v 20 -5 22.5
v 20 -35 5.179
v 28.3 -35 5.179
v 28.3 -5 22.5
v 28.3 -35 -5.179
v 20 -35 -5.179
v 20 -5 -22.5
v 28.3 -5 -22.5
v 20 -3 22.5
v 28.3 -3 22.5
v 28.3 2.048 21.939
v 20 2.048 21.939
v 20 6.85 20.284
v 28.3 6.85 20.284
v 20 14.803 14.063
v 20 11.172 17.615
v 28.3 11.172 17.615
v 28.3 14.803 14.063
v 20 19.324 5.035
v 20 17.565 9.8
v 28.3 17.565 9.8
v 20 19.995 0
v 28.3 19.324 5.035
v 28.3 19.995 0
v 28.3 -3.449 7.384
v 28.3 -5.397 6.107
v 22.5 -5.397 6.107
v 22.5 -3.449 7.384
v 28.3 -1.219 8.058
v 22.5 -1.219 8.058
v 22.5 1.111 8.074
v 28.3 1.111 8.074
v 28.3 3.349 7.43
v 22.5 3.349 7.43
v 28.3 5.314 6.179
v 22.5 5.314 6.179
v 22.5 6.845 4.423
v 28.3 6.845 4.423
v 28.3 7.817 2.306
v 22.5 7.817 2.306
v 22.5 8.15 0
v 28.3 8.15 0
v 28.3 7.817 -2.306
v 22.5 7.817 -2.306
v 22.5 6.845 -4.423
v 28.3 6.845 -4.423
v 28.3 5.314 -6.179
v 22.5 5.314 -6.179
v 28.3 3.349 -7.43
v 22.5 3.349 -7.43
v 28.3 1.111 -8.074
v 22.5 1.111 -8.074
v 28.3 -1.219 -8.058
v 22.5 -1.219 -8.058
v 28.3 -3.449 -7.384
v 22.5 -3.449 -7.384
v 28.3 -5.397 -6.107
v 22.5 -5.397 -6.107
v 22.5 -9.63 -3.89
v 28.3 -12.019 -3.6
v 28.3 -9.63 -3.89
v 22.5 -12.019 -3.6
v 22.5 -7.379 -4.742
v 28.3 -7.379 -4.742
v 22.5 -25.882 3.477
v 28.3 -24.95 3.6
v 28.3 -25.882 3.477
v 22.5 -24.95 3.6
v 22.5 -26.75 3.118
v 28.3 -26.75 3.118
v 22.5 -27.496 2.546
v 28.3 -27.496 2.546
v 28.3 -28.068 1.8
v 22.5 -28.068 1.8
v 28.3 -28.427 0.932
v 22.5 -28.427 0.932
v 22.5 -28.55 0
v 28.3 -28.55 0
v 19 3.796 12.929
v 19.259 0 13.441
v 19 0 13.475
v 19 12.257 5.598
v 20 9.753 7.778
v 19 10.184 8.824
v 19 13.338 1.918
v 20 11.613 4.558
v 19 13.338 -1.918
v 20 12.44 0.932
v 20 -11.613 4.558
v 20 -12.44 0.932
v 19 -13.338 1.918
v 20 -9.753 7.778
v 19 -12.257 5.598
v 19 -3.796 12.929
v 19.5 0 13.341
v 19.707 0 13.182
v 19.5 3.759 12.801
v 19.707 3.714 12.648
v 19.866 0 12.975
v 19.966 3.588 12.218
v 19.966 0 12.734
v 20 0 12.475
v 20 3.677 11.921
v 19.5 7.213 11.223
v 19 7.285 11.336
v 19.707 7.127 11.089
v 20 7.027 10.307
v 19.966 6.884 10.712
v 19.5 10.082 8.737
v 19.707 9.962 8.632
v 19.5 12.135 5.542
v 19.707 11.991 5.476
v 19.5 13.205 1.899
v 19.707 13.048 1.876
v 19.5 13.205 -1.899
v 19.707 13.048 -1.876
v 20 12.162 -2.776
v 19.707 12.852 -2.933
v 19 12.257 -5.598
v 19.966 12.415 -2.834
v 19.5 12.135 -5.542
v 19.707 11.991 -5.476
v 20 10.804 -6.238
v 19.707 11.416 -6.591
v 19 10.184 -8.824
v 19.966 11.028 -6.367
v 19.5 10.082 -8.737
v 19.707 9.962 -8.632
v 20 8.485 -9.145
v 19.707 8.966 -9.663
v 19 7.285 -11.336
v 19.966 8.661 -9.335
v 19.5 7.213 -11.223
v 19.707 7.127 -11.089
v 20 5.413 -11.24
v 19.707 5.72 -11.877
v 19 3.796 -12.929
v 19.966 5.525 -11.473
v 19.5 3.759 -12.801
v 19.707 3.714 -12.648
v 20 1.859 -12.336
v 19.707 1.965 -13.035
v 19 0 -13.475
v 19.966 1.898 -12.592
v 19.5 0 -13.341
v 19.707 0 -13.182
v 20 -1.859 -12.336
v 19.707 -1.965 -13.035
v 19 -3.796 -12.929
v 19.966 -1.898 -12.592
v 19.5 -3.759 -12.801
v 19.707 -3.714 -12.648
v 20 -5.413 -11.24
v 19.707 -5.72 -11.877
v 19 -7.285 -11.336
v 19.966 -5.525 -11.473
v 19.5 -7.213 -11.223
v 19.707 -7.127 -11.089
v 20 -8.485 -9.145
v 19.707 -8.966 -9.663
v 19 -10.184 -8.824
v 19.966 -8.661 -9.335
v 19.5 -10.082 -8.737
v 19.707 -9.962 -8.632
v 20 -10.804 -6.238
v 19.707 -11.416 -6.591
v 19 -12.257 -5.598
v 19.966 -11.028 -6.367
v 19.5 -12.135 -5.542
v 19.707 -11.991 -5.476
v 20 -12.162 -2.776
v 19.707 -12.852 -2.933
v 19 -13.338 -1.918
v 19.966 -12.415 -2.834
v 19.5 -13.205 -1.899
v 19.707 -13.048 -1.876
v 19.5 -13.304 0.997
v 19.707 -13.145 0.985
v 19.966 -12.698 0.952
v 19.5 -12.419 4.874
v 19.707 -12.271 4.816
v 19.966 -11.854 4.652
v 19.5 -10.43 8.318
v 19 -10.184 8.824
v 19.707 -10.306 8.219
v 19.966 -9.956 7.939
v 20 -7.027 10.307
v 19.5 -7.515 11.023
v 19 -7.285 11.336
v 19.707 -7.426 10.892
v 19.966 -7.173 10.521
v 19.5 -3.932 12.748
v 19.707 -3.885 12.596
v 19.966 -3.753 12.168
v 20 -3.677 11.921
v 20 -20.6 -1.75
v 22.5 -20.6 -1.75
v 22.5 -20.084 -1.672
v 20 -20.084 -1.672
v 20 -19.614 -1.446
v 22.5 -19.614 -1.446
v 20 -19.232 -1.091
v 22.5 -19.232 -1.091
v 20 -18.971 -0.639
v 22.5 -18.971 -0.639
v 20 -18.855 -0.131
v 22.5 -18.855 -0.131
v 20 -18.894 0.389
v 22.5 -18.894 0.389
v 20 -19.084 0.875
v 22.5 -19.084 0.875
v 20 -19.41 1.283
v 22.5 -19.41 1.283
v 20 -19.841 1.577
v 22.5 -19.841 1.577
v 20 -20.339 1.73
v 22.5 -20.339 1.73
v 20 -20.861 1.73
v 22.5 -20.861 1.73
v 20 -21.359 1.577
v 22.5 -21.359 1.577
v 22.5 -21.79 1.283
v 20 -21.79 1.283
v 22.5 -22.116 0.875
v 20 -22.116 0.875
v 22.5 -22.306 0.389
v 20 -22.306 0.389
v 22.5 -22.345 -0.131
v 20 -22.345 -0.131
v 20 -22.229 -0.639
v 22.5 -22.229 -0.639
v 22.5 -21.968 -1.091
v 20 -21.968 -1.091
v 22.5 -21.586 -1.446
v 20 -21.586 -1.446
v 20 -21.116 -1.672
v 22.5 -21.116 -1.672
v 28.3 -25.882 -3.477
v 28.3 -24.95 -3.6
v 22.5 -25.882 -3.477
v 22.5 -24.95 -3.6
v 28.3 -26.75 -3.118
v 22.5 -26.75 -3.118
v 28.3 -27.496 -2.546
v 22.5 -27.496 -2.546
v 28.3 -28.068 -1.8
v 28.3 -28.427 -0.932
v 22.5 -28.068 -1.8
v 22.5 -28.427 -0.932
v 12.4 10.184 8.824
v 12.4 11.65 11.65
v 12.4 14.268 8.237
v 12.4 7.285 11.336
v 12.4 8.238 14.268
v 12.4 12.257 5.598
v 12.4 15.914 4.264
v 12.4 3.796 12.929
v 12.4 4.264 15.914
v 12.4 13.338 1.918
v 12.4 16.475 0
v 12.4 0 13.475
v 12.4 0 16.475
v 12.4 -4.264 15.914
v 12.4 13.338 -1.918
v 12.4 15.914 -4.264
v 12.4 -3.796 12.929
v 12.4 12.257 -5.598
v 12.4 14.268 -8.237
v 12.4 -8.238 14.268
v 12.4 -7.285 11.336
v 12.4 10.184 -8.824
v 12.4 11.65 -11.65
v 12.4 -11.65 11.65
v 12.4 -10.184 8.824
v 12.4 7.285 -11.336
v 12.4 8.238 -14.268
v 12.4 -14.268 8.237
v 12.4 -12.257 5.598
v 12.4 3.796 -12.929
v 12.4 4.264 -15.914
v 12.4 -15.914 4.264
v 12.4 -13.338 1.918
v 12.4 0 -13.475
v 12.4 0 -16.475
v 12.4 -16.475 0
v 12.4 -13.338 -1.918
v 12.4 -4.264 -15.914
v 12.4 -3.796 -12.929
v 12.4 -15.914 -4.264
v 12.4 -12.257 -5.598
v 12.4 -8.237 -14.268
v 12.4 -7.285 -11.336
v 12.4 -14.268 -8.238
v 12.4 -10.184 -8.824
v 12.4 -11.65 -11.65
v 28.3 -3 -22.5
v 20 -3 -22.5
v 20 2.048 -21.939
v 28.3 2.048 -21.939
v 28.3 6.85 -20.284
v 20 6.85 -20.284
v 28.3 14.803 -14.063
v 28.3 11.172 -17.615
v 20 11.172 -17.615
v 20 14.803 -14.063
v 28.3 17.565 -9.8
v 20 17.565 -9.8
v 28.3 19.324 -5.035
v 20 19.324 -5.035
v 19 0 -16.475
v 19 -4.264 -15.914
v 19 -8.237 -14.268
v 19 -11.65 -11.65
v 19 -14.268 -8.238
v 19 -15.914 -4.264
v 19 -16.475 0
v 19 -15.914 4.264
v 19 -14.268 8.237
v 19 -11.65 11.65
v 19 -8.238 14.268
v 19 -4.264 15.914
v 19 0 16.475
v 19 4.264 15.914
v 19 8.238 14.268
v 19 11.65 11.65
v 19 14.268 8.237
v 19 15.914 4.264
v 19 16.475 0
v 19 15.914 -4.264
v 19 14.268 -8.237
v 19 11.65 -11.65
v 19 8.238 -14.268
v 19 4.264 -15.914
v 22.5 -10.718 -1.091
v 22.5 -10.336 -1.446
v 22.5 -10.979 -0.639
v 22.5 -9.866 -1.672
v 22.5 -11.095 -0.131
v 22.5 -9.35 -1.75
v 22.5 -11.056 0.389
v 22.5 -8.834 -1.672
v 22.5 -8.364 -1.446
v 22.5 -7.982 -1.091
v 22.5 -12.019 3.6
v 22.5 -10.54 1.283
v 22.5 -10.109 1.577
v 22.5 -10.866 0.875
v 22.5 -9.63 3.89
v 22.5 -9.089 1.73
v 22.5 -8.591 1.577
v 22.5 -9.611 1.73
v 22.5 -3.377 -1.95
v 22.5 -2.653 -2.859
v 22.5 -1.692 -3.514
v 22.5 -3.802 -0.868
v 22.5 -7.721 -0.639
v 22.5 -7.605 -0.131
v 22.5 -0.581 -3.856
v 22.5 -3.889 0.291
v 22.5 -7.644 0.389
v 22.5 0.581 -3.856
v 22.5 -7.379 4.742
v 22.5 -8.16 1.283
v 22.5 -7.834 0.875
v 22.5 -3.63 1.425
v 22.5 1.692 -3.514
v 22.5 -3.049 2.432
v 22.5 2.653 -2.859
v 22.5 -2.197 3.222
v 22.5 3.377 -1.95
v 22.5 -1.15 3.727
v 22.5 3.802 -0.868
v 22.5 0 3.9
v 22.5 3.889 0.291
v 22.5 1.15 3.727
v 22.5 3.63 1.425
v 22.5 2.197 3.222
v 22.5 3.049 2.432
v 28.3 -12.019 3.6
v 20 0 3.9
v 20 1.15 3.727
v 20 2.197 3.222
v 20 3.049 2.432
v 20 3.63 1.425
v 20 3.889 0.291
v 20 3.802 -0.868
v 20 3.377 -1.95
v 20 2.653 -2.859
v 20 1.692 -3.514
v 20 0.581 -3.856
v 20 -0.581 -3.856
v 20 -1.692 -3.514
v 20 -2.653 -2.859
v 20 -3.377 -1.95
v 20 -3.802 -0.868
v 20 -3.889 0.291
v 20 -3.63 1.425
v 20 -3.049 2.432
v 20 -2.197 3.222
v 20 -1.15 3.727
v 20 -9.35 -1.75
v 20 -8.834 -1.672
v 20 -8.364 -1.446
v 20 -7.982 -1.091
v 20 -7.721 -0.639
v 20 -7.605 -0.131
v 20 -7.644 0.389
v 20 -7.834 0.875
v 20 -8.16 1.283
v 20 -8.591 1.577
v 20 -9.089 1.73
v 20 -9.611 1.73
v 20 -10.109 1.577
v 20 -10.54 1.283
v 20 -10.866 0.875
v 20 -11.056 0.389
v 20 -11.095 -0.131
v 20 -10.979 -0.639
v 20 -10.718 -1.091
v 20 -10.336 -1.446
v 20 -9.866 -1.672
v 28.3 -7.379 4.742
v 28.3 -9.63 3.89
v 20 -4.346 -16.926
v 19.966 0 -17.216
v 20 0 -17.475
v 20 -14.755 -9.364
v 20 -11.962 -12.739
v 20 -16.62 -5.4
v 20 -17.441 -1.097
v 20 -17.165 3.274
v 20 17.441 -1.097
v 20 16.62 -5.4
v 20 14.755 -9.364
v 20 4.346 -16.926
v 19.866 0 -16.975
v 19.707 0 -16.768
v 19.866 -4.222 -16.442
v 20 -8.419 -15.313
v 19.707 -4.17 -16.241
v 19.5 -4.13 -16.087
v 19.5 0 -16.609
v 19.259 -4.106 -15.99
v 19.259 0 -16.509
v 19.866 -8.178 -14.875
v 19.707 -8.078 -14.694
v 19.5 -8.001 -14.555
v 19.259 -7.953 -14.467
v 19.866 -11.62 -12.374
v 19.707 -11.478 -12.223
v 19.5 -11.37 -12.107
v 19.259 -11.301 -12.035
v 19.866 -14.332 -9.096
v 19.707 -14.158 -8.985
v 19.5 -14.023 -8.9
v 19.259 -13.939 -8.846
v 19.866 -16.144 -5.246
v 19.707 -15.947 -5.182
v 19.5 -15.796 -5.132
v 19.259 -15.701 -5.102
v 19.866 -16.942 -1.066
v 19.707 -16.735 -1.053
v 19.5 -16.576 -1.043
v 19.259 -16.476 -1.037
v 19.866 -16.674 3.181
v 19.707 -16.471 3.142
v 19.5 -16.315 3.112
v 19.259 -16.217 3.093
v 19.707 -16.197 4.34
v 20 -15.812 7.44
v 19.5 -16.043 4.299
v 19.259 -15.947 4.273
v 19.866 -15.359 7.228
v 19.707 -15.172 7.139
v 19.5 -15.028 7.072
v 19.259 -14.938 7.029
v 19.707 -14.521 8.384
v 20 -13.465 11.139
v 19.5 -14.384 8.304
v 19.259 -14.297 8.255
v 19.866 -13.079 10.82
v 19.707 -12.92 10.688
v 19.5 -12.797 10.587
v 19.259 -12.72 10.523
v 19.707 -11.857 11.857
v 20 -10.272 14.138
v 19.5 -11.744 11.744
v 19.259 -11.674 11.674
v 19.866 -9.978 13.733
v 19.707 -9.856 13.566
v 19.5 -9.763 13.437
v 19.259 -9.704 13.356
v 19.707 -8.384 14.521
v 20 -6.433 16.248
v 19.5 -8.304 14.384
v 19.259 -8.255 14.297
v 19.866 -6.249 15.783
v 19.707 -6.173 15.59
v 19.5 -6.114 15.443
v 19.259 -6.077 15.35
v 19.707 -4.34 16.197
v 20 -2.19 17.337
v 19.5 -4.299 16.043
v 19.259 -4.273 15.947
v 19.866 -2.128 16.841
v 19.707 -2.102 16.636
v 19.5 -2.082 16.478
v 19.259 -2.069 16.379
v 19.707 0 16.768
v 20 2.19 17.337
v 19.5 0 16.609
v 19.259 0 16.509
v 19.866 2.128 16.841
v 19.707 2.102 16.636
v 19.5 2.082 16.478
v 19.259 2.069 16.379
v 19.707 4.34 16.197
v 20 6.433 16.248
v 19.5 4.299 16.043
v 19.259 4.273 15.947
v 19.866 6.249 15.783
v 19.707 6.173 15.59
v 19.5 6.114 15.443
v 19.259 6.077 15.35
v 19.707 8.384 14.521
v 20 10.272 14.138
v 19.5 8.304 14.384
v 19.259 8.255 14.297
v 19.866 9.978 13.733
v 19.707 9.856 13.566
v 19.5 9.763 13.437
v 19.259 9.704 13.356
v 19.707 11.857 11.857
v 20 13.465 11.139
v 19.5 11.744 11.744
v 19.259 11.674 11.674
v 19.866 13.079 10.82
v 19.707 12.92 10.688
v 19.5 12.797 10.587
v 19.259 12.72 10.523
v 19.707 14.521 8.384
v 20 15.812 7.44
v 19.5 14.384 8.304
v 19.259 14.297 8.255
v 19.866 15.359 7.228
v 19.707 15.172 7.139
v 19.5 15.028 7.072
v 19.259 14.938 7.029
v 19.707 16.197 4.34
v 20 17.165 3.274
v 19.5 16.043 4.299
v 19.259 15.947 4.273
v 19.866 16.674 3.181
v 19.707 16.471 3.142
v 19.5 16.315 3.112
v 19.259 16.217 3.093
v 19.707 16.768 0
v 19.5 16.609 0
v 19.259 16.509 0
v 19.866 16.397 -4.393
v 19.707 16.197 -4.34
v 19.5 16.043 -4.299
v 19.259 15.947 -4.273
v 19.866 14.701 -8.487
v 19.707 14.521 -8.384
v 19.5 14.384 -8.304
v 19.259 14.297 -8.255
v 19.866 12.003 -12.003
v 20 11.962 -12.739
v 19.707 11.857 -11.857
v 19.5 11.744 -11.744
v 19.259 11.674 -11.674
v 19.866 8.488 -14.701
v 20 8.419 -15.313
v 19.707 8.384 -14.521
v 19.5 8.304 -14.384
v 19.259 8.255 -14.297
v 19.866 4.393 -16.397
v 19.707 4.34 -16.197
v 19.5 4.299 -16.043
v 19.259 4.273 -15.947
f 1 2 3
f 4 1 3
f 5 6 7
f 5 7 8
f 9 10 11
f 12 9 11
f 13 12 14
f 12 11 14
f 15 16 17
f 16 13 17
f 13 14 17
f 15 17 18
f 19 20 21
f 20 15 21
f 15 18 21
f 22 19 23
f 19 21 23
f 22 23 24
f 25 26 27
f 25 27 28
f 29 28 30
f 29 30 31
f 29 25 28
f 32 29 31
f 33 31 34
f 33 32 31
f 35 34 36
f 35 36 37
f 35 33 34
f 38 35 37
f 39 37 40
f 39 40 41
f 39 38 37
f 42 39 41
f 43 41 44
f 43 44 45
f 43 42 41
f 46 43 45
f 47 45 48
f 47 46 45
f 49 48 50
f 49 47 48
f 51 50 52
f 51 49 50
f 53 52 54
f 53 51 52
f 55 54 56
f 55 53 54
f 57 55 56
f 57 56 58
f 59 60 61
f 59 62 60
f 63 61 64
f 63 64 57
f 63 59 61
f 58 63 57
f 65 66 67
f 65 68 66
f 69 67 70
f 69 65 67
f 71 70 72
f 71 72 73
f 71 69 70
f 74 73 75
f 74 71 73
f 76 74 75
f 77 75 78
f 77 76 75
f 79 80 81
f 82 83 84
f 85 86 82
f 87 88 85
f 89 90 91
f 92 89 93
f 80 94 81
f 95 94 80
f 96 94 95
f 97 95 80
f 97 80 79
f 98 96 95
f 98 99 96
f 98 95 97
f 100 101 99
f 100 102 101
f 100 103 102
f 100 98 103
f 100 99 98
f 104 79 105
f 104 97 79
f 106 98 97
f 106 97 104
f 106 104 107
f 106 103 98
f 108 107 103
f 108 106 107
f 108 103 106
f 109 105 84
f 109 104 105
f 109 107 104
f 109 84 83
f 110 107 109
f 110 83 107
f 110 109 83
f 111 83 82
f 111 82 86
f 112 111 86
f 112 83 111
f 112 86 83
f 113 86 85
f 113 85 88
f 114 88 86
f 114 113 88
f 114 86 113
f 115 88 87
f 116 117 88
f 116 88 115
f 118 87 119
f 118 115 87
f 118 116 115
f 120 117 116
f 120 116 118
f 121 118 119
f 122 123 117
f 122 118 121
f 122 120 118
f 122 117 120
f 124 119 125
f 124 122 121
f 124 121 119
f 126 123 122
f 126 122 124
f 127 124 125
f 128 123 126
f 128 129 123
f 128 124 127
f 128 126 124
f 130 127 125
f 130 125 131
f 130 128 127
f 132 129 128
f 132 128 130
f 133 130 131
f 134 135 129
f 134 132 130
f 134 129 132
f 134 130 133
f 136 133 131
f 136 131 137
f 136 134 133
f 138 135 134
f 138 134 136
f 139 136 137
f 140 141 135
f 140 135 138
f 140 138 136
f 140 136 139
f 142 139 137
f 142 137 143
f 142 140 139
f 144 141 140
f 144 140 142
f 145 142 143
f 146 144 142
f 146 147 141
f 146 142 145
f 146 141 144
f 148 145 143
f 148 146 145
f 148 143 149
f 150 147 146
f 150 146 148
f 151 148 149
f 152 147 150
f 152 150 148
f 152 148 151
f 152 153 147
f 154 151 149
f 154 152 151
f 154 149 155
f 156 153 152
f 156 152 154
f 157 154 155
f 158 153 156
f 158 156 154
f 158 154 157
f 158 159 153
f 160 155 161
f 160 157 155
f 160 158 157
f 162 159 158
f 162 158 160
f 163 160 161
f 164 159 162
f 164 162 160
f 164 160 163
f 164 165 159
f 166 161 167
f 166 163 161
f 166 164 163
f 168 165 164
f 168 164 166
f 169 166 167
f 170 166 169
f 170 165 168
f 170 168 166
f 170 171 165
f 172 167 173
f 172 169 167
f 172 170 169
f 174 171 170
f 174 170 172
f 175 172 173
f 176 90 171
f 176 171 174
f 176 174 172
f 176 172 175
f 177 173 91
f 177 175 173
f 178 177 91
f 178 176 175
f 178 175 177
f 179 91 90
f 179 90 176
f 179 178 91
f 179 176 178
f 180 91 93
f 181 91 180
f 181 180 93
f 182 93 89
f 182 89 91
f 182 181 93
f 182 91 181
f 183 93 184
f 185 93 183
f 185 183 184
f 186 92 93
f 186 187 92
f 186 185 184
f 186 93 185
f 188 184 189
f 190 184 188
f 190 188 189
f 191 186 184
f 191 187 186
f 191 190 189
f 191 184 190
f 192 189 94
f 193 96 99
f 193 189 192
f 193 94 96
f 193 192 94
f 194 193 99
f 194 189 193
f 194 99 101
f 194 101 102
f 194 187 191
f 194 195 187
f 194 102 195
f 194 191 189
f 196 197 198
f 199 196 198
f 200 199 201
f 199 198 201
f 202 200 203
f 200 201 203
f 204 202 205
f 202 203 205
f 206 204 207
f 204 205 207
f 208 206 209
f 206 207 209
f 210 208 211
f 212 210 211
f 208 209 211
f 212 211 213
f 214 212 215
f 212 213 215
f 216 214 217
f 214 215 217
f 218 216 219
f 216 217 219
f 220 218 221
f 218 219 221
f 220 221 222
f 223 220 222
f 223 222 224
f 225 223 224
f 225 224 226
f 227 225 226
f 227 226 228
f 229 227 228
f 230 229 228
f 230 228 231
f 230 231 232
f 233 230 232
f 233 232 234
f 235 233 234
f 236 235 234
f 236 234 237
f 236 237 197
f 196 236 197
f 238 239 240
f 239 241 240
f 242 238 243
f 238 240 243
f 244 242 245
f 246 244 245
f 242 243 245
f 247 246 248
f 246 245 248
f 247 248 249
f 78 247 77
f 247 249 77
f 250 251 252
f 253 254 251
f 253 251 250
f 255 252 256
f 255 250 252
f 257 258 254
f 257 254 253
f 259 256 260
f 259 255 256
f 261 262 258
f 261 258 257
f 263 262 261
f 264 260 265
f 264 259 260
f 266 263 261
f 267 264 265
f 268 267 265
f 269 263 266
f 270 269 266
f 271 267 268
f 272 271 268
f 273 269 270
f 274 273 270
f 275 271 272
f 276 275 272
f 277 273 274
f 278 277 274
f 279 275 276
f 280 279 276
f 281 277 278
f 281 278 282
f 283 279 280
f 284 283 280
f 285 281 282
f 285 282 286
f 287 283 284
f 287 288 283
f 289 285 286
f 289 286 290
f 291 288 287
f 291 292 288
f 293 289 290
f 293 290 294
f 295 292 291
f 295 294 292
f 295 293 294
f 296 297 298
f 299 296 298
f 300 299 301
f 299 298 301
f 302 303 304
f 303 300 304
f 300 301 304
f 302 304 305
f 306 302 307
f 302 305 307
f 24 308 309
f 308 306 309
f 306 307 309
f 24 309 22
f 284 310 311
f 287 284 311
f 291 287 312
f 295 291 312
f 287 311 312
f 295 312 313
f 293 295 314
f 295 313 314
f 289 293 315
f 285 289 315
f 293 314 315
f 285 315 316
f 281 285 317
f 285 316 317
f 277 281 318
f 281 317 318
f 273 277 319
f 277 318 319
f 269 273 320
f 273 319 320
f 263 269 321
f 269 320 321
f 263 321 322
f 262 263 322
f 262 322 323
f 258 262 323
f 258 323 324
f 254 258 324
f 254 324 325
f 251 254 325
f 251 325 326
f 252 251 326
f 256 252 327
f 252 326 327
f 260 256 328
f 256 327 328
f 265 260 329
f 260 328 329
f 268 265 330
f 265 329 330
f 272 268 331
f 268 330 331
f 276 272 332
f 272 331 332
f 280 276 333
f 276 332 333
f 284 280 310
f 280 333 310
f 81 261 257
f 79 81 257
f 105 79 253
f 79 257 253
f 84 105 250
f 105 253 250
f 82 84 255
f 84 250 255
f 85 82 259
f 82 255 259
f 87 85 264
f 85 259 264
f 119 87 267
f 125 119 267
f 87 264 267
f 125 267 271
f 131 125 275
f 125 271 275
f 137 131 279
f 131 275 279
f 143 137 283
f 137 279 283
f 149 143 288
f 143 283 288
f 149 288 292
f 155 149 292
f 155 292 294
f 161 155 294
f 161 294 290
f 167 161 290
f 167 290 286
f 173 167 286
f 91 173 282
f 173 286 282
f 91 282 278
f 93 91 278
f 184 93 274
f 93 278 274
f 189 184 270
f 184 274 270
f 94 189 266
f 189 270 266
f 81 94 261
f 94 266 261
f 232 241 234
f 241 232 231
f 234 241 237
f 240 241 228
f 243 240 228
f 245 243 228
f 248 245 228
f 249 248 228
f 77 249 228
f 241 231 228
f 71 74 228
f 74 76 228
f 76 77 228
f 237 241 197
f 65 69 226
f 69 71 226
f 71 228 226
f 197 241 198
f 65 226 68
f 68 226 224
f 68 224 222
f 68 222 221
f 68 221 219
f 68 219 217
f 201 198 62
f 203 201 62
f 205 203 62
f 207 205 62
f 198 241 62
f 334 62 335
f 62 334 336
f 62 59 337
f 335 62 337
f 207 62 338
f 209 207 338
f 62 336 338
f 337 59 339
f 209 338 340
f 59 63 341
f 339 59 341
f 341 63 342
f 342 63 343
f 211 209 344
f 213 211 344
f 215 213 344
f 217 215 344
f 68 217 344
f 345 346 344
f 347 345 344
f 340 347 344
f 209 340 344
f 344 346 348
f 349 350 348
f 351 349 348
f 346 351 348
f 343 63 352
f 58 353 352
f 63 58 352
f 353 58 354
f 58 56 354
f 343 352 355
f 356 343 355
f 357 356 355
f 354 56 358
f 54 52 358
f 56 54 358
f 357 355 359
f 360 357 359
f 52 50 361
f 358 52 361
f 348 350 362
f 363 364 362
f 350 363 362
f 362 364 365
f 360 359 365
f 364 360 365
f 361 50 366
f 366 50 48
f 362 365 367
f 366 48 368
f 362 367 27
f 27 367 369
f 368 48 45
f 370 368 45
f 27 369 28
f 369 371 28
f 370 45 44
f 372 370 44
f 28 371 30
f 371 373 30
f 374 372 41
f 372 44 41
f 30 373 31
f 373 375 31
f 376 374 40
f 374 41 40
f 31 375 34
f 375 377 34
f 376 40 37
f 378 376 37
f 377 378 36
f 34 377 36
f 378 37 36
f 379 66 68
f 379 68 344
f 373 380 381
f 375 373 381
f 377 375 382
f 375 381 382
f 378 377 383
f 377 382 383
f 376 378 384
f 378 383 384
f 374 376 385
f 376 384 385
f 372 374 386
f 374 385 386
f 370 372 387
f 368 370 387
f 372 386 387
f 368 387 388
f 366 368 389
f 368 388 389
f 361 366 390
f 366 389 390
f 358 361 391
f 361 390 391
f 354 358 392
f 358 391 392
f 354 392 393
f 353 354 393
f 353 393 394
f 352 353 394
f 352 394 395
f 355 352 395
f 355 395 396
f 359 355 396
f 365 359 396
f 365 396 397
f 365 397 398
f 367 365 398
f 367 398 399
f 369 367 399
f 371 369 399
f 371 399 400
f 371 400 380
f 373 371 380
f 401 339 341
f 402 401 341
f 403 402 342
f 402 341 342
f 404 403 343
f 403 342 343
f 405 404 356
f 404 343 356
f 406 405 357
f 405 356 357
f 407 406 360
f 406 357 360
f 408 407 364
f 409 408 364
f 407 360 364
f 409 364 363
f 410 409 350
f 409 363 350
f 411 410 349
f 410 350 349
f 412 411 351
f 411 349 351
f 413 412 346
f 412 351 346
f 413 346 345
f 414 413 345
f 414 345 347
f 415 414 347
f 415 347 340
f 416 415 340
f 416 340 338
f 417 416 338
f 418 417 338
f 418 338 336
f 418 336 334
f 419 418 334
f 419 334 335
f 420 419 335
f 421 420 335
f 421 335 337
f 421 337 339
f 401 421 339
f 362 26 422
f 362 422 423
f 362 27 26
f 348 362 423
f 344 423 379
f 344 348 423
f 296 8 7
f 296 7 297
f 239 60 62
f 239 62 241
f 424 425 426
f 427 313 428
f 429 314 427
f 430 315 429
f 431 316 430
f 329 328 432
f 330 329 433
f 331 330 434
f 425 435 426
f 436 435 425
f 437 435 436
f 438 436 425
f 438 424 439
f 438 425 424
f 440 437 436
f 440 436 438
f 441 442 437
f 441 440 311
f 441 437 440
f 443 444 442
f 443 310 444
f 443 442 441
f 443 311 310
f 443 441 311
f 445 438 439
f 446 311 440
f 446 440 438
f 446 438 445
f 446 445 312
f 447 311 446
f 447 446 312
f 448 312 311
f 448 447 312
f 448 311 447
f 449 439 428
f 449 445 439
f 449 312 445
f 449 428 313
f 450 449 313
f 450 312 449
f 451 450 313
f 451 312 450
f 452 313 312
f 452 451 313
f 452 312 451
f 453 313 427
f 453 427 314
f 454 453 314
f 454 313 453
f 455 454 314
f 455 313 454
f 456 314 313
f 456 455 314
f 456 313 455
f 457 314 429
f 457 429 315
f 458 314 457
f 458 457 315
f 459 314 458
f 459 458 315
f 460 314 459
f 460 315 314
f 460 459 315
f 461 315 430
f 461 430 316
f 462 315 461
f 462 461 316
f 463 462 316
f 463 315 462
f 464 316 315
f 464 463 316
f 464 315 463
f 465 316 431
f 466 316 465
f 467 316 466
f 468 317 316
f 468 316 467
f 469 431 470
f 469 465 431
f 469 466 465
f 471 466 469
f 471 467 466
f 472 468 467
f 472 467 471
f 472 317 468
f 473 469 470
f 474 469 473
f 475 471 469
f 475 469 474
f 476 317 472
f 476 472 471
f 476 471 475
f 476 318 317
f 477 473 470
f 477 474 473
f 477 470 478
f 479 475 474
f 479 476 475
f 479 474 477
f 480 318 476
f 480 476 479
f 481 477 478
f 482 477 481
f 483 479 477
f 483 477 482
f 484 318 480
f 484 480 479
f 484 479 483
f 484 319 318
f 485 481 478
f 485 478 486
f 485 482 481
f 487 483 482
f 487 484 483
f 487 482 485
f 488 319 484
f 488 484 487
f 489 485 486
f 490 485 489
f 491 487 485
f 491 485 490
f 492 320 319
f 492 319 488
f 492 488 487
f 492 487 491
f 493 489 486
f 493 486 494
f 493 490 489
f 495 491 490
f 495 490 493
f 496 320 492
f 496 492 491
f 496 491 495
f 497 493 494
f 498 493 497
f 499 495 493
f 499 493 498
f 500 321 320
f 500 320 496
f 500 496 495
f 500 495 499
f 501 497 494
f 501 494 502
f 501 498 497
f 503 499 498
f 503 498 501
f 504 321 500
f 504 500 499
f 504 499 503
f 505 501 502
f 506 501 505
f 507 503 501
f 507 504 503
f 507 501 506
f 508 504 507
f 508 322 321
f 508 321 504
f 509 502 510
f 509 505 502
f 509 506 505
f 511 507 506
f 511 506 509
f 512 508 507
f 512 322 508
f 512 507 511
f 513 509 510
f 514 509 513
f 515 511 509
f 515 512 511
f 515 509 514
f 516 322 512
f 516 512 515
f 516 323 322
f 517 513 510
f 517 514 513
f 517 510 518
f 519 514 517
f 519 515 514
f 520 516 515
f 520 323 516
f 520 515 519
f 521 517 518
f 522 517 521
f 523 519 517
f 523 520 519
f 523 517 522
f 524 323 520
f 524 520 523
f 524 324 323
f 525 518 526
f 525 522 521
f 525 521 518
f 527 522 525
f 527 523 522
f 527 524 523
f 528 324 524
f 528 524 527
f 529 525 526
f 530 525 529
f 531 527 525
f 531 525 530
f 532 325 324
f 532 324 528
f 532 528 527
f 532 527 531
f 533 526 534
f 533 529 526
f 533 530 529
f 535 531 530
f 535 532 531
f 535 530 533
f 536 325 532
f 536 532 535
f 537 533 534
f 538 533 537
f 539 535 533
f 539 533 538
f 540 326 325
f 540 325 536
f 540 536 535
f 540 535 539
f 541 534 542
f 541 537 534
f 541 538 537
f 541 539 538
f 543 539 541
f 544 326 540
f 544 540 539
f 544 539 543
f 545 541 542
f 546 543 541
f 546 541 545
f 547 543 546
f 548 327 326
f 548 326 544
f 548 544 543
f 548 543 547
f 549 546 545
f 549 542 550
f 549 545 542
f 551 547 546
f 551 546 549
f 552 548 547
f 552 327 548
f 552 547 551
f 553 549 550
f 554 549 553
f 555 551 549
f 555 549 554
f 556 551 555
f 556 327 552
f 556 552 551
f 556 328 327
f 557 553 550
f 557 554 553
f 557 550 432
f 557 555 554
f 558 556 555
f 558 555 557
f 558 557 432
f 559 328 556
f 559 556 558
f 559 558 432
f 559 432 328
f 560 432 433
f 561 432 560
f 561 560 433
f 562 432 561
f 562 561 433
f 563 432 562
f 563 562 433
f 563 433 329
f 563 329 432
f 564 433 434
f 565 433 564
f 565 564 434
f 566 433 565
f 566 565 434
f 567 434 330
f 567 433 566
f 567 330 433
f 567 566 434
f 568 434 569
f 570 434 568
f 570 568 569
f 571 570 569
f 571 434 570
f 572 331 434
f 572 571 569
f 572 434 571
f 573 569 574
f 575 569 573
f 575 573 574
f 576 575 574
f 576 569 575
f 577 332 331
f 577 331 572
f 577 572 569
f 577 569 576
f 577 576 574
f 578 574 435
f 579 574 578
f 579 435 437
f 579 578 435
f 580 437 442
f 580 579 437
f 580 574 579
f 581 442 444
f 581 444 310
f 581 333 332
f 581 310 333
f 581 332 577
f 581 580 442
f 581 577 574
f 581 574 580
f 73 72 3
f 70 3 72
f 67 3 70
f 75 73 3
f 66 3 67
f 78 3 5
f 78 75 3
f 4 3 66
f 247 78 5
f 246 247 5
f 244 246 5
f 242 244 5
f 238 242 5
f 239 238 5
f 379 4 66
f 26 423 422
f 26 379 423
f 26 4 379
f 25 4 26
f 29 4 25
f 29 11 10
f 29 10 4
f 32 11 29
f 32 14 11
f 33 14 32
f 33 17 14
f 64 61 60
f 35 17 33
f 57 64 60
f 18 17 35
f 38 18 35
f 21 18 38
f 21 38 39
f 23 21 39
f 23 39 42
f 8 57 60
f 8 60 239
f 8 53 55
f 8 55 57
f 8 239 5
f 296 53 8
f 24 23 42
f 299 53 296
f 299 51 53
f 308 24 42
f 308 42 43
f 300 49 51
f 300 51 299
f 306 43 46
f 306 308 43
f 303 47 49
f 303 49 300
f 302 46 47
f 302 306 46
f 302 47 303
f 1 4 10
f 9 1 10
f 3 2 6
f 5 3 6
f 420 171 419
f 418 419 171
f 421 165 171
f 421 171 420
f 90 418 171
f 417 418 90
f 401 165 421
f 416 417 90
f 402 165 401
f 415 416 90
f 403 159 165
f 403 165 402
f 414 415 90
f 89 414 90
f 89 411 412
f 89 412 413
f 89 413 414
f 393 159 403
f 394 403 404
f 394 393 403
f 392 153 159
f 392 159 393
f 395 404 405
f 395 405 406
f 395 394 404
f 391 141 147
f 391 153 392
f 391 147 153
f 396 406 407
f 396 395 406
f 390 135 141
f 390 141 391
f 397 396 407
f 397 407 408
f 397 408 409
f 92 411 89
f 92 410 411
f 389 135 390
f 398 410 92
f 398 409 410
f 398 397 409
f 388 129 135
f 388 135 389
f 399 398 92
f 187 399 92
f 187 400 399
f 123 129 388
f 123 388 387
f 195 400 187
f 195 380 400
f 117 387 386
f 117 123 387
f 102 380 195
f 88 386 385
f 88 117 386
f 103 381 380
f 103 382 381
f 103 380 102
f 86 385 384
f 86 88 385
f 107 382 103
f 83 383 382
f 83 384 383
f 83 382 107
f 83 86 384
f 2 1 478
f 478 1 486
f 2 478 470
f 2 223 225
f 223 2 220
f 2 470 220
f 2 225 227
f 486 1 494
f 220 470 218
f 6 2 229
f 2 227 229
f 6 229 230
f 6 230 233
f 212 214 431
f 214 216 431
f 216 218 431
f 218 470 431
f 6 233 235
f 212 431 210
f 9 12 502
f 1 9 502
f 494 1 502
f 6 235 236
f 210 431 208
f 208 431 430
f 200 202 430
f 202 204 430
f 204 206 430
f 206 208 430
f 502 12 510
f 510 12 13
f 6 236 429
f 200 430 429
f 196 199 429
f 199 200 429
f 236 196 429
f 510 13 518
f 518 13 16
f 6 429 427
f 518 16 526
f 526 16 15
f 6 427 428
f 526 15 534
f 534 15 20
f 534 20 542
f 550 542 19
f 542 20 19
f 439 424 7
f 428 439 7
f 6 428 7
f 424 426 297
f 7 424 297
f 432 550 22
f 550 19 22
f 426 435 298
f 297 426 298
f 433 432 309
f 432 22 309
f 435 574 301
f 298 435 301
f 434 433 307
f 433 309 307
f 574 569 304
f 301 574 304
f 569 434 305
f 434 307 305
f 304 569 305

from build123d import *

# Parameters (mm, degrees)
SKETCH1_W           = 20
SKETCH1_H           = 20
BOSS_EXTRUDE1_DEPTH = 20
SKETCH2_W           = 45
SKETCH2_H           = 70
BOSS_EXTRUDE2_DEPTH = 8.3
CUT_EXTRUDE1_DEPTH  = 5.8
FILLET1_R           = 3.6
FILLET2_R           = 10
SKETCH5_R           = 3.9
CUT_EXTRUDE2_DEPTH  = 51.320373608
CUT_EXTRUDE3_REACH  = 49.302
SKETCH6_R           = 1.75
SKETCH13_W          = 20
SKETCH13_H          = 20
CUT_EXTRUDE9_DEPTH  = 20
SKETCH14_R          = 16.475
BOSS_EXTRUDE3_DEPTH = 7.6
SKETCH15_W          = 8.3
SKETCH15_H          = 45
CUT_EXTRUDE10_DEPTH = 15
FILLET3_R           = 23
CHAMFER1_SIZE       = 30
CHAMFER1_SIZE2      = 17.320508076
CHAMFER2_SIZE       = 30
CHAMFER2_SIZE2      = 17.320508076
SKETCH16_R          = 13.475
CUT_EXTRUDE11_DEPTH = 7.6
FILLET4_R           = 1


# Some blends are built 0.0001 mm under size
with BuildPart() as part:
    # Sketch1 → Boss-Extrude1 (new body)
    with BuildSketch(Plane(origin=(0, 0, 0), x_dir=(0, 0, -1), z_dir=(1, 0, 0))):
        Rectangle(SKETCH1_W, SKETCH1_H)
    extrude(amount=BOSS_EXTRUDE1_DEPTH)

    # Sketch2 → Boss-Extrude2 (add)
    with BuildSketch(Plane(origin=(20, 0, 0), x_dir=(0, 0, -1), z_dir=(1, 0, 0))):
        Rectangle(SKETCH2_W, SKETCH2_H)
    extrude(amount=BOSS_EXTRUDE2_DEPTH)

    # Sketch4 → Cut-Extrude1 (cut)
    with BuildSketch(Plane(origin=(28.3, 0, 0), x_dir=(0, 0, -1), z_dir=(1, 0, 0))):
        with BuildLine():
            Line((3.6, -28.55), (-3.6, -28.55))
            Line((-3.6, -28.55), (-3.6, -7.311805523))
            ThreePointArc((-3.6, -7.311805523), (0, 8.15), (3.6, -7.311805523))
            Line((3.6, -7.311805523), (3.6, -28.55))
        make_face()
    extrude(amount=-CUT_EXTRUDE1_DEPTH, mode=Mode.SUBTRACT)

    # Fillet1
    fillet1_edges = [part.edges().sort_by_distance(p)[0] for p in [
        (25.4, -28.55, 3.6),
        (25.4, -28.55, -3.6),
    ]]
    fillet(fillet1_edges, radius=FILLET1_R - 0.0001)  # a hair under: the kernel refuses the full size

    # Fillet2
    fillet2_edges = [part.edges().sort_by_distance(p)[0] for p in [
        (25.4, -7.311805523, 3.6),
        (25.4, -7.311805523, -3.6),
    ]]
    fillet(fillet2_edges, radius=FILLET2_R)

    # Sketch5 → Cut-Extrude2 (cut, through all)
    with BuildSketch(Plane.ZY):
        Circle(SKETCH5_R)
    extrude(amount=-CUT_EXTRUDE2_DEPTH, mode=Mode.SUBTRACT)

    # Sketch6 → Cut-Extrude3 (cut, up to next)
    with BuildSketch(Plane(origin=(22.5, 0, 0), x_dir=(0, 0, -1), z_dir=(1, 0, 0)), mode=Mode.PRIVATE) as cut_extrude3_sk1:
        with Locations((0, -20.6)):
            Circle(SKETCH6_R)
    cut_extrude3_tool1 = extrude(cut_extrude3_sk1.sketch, amount=-CUT_EXTRUDE3_REACH, mode=Mode.PRIVATE) & part.part
    # Sketch6 → Cut-Extrude3 (cut, up to next)
    with BuildSketch(Plane(origin=(22.5, 0, 0), x_dir=(0, 0, -1), z_dir=(1, 0, 0)), mode=Mode.PRIVATE) as cut_extrude3_sk2:
        with Locations((0, -9.35)):
            Circle(SKETCH6_R)
    cut_extrude3_tool2 = extrude(cut_extrude3_sk2.sketch, amount=-CUT_EXTRUDE3_REACH, mode=Mode.PRIVATE) & part.part
    add(cut_extrude3_tool1.solids().sort_by_distance((22.5, -20.6, 0))[0], mode=Mode.SUBTRACT)
    add(cut_extrude3_tool2.solids().sort_by_distance((22.5, -9.35, 0))[0], mode=Mode.SUBTRACT)

    # Sketch13 → Cut-Extrude9 (cut)
    with BuildSketch(Plane.ZY):
        Rectangle(SKETCH13_W, SKETCH13_H)
    extrude(amount=-CUT_EXTRUDE9_DEPTH, mode=Mode.SUBTRACT)

    # Sketch14 → Boss-Extrude3 (add)
    with BuildSketch(Plane.ZY.offset(-20)):
        with Locations(Location((0, 0, 0), (0, 0, 180))):
            Circle(SKETCH14_R)
    extrude(amount=BOSS_EXTRUDE3_DEPTH)

    # Sketch15 → Cut-Extrude10 (cut)
    with BuildSketch(Plane(origin=(0, 35, 0), x_dir=(1, 0, 0), z_dir=(0, 1, 0))):
        with Locations((24.15, 0)):
            Rectangle(SKETCH15_W, SKETCH15_H)
    extrude(amount=-CUT_EXTRUDE10_DEPTH, mode=Mode.SUBTRACT)

    # Fillet3
    # the kernel refuses this fillet: 23 mm, written as the material it takes off along each edge
    with BuildSketch(Plane(origin=(-37.5, 20, -22.5), x_dir=(0, -1, 0), z_dir=(1, 0, 0)), Plane(origin=(85.8, 20, 22.5), x_dir=(0, -1, 0), z_dir=(-1, 0, 0))) as fillet3_piece_1:
        with BuildLine():
            CenterArc((FILLET3_R, -FILLET3_R), FILLET3_R, 90, 90)
            Line((0, -FILLET3_R), (0, 0))
            Line((0, 0), (FILLET3_R, 0))
        make_face()
    extrude(amount=123.3, mode=Mode.SUBTRACT)

    # Chamfer1
    chamfer1_edges = [part.edges().sort_by_distance(p)[0] for p in [
        (24.15, -35, 22.5),
    ]]
    chamfer1_side = [part.faces().sort_by_distance(p)[0] for p in [
        (24.15, -19, 22.5),
    ]]
    chamfer(chamfer1_edges, length=CHAMFER1_SIZE, length2=CHAMFER1_SIZE2, reference=chamfer1_side[0])

    # Chamfer2
    chamfer2_edges = [part.edges().sort_by_distance(p)[0] for p in [
        (24.15, -35, -22.5),
    ]]
    chamfer2_side = [part.faces().sort_by_distance(p)[0] for p in [
        (24.15, -19, -22.5),
    ]]
    chamfer(chamfer2_edges, length=CHAMFER2_SIZE, length2=CHAMFER2_SIZE2, reference=chamfer2_side[0])

    # Sketch16 → Cut-Extrude11 (cut)
    with BuildSketch(Plane.ZY.offset(-12.4)):
        Circle(SKETCH16_R)
    extrude(amount=-CUT_EXTRUDE11_DEPTH, mode=Mode.SUBTRACT)

    # Fillet4
    fillet4_edges = [part.edges().sort_by_distance(p)[0] for p in [
        (20, 0, 16.475),
        (20, 0, -13.475),
    ]]
    fillet(fillet4_edges, radius=FILLET4_R)


solid = part.part
